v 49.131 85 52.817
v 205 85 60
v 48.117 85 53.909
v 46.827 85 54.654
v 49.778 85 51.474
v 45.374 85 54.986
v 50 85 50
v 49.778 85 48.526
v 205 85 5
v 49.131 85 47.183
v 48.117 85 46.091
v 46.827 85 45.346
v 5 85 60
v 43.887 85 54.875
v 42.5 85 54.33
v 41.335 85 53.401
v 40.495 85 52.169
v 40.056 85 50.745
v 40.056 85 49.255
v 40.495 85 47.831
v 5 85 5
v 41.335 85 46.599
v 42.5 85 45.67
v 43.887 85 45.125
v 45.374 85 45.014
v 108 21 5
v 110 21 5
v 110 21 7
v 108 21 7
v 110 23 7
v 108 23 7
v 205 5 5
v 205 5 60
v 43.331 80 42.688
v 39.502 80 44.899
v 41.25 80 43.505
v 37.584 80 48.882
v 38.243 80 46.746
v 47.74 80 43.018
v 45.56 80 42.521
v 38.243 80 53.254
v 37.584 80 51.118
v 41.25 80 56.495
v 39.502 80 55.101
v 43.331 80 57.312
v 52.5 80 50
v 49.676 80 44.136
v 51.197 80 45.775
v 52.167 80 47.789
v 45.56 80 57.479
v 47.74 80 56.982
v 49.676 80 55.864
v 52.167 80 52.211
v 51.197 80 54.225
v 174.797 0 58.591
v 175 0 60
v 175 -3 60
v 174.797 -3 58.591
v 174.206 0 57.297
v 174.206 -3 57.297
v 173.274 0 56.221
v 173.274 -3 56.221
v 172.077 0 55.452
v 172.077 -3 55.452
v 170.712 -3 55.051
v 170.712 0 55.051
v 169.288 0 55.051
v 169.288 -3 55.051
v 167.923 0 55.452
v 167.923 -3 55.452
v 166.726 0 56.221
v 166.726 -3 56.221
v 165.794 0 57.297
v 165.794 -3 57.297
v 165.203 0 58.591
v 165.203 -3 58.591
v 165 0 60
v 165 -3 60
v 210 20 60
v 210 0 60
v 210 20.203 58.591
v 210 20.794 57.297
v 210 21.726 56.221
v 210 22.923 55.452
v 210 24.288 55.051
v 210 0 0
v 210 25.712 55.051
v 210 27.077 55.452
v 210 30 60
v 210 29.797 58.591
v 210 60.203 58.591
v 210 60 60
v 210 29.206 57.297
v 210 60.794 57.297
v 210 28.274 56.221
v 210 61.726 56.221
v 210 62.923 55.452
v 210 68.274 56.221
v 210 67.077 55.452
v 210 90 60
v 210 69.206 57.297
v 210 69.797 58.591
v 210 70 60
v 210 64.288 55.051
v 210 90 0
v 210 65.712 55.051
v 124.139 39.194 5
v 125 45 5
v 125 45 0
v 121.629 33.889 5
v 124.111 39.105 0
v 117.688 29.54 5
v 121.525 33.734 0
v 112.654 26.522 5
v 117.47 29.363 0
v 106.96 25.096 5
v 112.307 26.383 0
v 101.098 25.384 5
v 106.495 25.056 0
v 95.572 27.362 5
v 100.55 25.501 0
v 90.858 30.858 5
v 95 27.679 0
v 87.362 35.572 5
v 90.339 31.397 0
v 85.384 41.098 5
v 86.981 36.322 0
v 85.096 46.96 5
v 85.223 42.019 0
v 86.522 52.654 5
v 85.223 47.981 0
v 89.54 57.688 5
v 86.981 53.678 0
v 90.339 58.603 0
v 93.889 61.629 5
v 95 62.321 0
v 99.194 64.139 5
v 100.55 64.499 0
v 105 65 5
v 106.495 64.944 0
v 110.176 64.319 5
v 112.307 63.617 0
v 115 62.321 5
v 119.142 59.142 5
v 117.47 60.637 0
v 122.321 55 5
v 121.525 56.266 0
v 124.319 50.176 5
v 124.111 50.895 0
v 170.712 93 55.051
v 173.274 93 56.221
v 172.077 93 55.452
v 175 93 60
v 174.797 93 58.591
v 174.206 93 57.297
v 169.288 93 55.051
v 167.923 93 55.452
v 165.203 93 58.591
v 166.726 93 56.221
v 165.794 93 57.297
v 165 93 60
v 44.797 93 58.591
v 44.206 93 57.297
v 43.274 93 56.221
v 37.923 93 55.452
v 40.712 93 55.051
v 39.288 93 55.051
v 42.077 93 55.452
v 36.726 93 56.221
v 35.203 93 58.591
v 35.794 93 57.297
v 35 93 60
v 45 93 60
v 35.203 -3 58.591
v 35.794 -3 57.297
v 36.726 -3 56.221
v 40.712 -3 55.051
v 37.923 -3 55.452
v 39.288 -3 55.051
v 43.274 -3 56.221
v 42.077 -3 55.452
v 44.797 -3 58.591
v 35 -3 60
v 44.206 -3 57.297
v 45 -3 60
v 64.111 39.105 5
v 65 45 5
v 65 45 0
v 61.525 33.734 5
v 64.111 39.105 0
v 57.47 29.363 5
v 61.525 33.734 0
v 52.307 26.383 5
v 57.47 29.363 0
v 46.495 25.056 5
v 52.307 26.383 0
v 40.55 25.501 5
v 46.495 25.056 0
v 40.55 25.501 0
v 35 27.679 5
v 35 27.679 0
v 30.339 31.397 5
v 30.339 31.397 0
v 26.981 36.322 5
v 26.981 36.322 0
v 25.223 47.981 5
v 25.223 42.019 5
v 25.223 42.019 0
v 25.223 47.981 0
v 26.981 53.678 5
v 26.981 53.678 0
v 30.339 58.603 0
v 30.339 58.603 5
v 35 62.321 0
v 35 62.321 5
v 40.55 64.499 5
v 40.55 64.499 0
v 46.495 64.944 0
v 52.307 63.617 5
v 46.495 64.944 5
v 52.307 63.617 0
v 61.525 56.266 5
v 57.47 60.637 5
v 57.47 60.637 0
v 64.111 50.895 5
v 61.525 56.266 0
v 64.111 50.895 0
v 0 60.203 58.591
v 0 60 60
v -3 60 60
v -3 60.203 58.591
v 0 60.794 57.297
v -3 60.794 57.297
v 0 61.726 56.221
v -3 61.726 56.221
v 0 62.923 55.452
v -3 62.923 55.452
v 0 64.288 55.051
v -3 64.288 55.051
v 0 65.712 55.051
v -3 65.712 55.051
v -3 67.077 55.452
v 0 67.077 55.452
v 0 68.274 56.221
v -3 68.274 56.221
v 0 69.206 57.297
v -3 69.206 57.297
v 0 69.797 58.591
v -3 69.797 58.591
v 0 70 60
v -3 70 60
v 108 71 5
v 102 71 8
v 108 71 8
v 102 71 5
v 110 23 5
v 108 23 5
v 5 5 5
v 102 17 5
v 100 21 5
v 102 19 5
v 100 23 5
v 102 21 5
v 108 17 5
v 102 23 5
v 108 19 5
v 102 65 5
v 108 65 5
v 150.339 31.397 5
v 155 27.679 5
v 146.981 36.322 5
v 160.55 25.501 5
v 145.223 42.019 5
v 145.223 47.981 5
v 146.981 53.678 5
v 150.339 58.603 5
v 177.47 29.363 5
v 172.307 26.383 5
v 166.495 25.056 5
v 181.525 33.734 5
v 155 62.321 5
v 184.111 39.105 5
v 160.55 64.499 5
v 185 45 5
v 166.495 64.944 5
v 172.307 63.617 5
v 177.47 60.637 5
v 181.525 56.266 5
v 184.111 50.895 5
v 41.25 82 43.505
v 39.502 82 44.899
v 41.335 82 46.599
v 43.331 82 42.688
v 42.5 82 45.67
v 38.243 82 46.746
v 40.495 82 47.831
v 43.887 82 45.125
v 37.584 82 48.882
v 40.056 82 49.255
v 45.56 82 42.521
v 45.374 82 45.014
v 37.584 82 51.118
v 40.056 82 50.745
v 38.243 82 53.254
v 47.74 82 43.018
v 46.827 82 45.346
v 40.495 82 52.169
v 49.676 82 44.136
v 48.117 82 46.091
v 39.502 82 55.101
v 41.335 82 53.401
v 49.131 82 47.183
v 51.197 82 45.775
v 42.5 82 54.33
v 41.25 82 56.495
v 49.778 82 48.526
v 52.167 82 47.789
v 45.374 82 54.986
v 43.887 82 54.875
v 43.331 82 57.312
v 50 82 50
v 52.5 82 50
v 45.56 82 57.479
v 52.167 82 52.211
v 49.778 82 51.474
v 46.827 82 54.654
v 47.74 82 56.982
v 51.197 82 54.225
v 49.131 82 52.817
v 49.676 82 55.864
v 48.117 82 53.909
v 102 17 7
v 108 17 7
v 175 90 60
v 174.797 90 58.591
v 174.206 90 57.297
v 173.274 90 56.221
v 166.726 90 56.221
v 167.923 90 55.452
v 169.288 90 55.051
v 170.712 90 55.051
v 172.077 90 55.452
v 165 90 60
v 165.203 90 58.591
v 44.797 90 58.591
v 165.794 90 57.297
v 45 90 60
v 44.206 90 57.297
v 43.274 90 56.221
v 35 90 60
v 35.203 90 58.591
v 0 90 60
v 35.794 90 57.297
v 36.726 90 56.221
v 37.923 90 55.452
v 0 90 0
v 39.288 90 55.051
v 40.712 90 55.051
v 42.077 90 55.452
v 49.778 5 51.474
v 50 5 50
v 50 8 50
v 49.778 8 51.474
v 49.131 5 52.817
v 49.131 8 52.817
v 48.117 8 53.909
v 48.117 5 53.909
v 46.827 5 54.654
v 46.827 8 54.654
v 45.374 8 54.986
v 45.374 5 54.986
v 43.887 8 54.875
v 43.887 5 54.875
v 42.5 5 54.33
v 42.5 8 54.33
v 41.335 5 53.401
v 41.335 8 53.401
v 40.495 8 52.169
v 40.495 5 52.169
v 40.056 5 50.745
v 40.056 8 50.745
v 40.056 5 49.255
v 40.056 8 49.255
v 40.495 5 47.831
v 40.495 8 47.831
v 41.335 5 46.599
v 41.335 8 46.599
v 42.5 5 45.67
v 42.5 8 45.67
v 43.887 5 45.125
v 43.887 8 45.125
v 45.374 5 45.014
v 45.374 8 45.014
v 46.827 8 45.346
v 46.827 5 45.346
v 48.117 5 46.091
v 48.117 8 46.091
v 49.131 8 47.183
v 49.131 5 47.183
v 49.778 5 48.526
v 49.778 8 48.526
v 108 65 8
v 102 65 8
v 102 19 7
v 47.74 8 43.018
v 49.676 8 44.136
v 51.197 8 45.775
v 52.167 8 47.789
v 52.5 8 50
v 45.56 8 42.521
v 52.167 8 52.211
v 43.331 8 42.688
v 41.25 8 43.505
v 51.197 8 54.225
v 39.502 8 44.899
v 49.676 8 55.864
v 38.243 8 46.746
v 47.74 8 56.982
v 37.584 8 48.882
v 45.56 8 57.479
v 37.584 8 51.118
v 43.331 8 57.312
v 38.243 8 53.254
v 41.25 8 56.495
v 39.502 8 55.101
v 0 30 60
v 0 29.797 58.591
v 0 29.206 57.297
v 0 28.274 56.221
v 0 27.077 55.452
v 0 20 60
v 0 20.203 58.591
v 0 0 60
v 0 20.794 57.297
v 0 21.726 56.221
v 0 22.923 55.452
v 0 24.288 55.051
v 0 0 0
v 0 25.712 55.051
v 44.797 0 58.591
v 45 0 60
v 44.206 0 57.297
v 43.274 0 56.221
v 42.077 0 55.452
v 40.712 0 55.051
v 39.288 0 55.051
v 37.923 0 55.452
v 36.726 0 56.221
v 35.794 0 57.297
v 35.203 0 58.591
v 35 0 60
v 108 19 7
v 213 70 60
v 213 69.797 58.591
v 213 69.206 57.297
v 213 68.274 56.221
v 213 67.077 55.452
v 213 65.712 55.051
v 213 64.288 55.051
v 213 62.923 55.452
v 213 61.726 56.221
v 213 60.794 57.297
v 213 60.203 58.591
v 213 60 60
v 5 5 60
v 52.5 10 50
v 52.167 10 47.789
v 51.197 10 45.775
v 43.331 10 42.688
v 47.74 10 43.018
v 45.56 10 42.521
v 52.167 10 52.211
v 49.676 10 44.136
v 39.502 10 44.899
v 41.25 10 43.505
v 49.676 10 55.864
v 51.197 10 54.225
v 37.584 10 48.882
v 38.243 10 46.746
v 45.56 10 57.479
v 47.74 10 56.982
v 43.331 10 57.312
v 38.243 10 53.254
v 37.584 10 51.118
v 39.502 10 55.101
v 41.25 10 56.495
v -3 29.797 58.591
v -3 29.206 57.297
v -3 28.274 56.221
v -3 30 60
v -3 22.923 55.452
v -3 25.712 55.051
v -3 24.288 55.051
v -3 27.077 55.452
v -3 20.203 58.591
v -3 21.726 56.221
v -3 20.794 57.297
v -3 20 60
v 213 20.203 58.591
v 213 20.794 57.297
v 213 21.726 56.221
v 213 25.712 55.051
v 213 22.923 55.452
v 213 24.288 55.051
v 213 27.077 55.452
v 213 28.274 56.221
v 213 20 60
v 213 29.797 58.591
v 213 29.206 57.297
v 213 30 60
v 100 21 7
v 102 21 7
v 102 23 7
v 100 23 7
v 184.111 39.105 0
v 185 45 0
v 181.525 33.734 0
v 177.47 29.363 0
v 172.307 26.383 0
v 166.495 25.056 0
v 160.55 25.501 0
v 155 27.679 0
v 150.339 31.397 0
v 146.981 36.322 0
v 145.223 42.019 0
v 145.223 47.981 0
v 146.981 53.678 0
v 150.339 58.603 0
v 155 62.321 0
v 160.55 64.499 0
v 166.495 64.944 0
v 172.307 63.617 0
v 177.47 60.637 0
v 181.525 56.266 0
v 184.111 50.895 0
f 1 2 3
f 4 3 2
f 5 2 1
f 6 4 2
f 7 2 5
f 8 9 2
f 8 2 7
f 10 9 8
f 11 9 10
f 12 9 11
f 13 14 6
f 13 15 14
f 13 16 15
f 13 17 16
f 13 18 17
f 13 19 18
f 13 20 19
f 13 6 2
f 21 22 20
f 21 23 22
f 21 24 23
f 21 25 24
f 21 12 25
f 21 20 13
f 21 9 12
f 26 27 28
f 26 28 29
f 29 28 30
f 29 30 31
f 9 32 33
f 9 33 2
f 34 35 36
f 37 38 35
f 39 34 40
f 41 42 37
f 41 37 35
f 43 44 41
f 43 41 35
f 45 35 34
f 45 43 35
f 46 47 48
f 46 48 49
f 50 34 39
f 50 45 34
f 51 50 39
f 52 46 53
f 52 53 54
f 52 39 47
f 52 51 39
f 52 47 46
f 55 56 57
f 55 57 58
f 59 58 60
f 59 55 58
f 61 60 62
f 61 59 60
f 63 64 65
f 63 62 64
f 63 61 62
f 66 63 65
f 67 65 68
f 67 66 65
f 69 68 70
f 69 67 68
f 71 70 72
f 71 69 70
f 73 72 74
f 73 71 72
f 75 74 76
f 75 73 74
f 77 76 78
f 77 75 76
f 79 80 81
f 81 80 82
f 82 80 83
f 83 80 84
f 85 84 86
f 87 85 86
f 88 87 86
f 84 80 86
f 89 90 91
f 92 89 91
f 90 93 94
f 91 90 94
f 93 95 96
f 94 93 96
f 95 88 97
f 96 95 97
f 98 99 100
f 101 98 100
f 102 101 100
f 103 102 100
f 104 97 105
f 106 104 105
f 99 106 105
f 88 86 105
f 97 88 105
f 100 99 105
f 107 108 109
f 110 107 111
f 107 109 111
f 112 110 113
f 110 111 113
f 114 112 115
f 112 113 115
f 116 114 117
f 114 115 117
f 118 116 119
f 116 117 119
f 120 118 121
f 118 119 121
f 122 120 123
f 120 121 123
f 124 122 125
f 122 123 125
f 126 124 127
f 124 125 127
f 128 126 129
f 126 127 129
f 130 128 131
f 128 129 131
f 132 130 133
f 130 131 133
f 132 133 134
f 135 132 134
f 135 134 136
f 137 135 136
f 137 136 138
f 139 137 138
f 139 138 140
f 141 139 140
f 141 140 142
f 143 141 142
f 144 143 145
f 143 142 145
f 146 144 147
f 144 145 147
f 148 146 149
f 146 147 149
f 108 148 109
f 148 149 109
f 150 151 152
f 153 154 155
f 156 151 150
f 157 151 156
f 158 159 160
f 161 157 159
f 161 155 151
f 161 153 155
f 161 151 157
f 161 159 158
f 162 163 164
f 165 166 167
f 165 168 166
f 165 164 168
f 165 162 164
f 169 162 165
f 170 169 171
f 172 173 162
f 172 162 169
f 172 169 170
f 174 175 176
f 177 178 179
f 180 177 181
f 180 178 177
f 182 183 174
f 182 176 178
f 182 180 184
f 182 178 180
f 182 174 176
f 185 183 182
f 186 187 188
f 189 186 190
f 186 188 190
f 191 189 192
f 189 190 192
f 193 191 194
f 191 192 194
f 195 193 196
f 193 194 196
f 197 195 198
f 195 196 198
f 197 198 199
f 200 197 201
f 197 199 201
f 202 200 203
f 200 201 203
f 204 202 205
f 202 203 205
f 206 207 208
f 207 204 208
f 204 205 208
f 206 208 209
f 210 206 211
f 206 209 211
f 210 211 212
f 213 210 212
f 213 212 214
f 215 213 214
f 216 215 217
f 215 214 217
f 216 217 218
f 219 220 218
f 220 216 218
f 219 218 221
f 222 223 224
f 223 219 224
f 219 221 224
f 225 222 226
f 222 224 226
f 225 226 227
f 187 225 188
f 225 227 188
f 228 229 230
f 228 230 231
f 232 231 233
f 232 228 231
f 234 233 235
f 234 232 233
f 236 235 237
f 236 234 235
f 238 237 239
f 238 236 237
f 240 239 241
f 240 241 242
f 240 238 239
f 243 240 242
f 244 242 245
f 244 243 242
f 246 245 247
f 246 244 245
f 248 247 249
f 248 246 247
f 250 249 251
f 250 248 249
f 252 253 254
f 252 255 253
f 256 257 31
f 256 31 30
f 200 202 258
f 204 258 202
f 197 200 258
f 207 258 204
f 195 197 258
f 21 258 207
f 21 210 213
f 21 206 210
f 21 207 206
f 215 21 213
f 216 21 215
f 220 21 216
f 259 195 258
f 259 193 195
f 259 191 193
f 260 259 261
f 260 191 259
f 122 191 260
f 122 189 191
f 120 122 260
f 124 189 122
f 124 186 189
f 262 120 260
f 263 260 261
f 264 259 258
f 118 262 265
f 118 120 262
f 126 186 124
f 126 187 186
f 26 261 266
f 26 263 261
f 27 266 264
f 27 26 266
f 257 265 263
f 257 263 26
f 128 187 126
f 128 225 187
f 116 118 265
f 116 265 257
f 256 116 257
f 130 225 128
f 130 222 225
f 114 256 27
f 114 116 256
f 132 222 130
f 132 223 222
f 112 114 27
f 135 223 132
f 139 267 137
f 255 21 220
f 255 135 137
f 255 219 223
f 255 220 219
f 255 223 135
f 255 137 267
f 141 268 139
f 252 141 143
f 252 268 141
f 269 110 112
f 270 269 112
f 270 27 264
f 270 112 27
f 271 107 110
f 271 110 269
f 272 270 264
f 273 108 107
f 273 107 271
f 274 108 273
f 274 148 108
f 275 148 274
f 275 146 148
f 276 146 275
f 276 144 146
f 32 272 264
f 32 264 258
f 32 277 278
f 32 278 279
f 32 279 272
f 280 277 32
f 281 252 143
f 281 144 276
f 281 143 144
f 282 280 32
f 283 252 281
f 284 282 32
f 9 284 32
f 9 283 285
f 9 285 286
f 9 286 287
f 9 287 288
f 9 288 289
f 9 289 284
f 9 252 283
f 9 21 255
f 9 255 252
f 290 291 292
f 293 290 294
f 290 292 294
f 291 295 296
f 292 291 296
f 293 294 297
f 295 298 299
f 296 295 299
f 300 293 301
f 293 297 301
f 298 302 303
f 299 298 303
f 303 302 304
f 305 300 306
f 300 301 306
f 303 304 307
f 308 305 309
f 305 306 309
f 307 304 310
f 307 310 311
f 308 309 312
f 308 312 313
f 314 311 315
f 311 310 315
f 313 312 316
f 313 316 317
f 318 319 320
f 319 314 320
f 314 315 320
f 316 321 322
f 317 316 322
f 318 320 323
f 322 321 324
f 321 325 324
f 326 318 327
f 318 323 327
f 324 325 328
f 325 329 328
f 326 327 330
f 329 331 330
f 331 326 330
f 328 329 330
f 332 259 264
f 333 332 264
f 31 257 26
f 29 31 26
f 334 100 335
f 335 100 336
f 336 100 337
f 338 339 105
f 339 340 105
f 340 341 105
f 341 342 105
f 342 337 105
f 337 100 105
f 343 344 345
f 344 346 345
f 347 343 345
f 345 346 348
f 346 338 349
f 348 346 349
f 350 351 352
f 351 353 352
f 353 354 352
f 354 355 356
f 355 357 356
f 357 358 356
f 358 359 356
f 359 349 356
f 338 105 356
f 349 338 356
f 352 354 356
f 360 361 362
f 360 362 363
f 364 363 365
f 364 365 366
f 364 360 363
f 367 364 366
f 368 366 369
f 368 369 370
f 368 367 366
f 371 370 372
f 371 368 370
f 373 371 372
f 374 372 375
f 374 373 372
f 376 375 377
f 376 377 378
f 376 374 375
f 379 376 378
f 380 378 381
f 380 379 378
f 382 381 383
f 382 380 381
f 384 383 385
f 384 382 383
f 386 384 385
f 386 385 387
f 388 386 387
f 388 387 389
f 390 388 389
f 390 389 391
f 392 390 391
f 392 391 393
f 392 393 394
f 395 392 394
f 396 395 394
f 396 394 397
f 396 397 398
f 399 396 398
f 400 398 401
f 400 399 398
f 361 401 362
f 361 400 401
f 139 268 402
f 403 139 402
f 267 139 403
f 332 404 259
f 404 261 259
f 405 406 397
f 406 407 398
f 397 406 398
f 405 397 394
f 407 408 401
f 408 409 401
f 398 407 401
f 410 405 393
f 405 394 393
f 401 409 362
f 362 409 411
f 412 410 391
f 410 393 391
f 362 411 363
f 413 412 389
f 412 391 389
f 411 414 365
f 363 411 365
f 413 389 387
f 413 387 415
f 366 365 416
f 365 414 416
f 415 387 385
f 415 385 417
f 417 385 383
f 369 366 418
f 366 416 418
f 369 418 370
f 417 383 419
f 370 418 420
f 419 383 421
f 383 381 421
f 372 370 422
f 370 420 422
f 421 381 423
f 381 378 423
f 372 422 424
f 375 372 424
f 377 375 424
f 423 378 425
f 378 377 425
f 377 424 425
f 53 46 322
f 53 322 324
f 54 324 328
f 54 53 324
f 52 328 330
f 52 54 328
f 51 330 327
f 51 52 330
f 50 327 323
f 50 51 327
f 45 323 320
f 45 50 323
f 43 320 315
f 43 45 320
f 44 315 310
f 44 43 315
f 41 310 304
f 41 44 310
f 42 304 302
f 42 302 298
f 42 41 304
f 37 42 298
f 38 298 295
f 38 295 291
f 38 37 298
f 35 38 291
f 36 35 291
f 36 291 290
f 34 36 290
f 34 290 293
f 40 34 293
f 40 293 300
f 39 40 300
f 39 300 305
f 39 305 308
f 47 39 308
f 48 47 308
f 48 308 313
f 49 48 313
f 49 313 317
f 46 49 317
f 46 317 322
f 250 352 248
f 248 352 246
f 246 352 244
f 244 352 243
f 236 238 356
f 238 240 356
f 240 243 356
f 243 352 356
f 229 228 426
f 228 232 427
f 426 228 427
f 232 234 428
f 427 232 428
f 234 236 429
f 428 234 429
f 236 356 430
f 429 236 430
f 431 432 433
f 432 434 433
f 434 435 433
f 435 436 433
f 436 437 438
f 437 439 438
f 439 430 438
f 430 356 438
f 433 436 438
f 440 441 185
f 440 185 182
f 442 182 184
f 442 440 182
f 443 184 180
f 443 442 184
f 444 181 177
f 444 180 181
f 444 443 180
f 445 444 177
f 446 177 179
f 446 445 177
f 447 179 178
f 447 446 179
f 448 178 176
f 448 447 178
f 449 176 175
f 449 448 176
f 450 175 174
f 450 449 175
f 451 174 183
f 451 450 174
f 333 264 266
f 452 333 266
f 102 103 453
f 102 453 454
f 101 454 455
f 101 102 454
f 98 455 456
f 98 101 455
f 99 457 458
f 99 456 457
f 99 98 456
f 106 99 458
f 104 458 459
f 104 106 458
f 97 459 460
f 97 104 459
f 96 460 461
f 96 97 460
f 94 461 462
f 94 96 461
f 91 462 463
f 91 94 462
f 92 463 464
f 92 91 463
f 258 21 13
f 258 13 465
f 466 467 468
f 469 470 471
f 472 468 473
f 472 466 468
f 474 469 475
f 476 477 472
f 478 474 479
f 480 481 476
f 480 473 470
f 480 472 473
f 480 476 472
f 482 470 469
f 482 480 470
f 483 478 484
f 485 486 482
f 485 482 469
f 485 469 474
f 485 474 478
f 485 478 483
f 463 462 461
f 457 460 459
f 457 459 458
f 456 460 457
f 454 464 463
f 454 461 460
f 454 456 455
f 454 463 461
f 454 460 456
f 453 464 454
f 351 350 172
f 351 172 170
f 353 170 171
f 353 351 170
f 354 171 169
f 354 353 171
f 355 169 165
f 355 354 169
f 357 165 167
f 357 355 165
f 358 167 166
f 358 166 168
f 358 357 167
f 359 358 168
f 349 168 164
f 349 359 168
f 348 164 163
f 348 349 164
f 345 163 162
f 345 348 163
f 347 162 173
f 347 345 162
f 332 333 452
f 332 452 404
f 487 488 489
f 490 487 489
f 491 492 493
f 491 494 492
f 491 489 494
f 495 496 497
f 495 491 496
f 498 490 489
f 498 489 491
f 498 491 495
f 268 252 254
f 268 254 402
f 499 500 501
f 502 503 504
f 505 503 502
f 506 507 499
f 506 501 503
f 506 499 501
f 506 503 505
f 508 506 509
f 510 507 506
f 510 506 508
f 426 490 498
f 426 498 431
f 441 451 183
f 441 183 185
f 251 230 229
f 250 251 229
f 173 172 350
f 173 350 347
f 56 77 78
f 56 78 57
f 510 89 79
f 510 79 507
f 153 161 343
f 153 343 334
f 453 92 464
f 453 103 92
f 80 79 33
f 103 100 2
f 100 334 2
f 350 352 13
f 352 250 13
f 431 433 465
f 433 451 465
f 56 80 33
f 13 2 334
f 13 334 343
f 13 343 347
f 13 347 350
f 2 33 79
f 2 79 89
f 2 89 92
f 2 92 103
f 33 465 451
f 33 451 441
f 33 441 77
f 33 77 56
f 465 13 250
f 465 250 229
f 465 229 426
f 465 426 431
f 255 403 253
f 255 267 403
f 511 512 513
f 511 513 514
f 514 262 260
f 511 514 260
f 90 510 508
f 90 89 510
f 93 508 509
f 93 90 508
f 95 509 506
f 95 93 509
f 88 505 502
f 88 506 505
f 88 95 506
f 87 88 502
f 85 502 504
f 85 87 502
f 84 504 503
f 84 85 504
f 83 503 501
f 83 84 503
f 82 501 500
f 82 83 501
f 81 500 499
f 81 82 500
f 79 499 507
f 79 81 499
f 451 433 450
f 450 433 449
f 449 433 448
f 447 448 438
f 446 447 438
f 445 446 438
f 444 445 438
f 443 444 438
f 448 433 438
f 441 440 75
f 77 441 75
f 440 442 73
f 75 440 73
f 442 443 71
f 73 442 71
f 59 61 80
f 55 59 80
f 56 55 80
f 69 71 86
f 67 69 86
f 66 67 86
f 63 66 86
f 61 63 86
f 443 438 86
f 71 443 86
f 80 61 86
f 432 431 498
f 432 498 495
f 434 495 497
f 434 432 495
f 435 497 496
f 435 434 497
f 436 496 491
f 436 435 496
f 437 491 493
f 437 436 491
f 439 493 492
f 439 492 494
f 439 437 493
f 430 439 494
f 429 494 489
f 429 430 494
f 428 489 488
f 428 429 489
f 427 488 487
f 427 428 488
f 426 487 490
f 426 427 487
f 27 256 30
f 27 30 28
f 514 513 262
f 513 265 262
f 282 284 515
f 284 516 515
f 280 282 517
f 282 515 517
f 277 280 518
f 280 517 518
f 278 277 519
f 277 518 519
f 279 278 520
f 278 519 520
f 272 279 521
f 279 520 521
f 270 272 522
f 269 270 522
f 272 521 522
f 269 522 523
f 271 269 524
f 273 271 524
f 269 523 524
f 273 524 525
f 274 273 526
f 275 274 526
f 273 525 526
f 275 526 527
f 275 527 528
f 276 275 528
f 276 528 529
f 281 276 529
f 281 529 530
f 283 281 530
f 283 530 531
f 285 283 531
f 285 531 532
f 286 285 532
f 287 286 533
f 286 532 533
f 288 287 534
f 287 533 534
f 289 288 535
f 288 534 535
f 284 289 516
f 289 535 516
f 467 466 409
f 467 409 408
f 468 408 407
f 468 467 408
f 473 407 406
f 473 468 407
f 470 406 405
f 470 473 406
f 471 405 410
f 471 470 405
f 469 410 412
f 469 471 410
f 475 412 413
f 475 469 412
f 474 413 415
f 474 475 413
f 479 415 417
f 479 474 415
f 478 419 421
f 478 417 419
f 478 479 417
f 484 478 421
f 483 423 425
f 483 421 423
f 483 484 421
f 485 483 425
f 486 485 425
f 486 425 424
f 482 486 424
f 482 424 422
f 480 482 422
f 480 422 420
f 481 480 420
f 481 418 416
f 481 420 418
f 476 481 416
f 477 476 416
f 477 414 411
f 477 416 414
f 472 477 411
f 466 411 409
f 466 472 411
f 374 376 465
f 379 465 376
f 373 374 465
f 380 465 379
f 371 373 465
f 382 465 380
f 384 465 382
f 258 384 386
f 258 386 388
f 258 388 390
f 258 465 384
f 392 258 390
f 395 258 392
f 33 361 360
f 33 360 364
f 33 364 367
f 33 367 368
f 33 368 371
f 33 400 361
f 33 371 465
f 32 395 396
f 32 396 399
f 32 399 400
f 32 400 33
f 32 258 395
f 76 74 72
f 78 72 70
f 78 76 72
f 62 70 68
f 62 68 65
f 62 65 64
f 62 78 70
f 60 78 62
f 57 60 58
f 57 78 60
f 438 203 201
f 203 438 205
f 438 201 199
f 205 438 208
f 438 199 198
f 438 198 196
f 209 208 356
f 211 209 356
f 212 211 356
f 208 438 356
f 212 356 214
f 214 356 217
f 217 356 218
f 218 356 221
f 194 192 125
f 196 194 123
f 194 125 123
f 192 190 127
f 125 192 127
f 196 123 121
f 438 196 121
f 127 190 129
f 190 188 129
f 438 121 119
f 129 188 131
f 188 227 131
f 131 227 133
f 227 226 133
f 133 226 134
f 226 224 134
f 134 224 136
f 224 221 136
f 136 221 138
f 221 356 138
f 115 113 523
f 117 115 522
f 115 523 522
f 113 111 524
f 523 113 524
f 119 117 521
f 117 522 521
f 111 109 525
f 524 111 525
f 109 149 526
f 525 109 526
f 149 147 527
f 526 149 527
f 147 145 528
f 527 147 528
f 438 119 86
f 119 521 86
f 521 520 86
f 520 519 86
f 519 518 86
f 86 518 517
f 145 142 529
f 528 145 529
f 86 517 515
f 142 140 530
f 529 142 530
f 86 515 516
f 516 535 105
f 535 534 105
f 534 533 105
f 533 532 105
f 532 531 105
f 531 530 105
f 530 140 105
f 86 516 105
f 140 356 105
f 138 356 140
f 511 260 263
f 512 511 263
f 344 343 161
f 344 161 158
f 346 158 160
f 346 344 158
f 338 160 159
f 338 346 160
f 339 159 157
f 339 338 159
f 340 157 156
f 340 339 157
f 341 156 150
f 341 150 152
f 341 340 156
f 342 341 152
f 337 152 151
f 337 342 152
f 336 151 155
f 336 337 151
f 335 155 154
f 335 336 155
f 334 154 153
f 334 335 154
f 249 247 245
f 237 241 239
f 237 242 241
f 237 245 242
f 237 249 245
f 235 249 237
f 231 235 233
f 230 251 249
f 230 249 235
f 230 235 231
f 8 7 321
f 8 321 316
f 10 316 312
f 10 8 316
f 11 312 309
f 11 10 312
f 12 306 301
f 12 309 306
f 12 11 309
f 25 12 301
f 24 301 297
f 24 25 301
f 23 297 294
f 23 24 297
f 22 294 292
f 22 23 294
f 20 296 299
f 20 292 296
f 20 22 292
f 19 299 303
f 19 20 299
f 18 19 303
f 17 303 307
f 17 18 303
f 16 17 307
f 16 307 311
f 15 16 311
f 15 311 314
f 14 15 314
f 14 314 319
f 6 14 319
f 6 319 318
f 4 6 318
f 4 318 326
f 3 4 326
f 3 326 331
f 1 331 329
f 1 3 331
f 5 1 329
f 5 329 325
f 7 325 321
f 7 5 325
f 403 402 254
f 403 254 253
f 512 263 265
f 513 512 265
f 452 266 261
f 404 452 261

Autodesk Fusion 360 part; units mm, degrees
sketch "Sketch1" plane through (0, 0, 0) normal (0, 0, 1) x (1, 0, 0)
  line L0 (0, 0) -> (210, 0)
  line L1 (210, 0) -> (210, 90)
  line L2 (210, 90) -> (0, 90)
  line L3 (0, 90) -> (0, 0)
  line L4 (5, 5) -> (205, 5)
  line L5 (205, 5) -> (205, 85)
  line L6 (205, 85) -> (5, 85)
  line L7 (5, 85) -> (5, 5)
  circle A0 centre (45, 45) radius 20
  circle A1 centre (105, 45) radius 20
  circle A2 centre (165, 45) radius 20
  dimension "d1" = 210
  dimension "d2" = 90
  dimension "d3" = 200
  dimension "d4" = 80
  dimension "d5" = 5
  dimension "d6" = 5
  dimension "d7" = 40
  dimension "d8" = 40
  dimension "d9" = 40
  dimension "d10" = 105
  dimension "d11" = 45
  dimension "d12" = 45
  dimension "d13" = 45
  dimension "d14" = 60
  dimension "d15" = 60
extrude "Extrude1" add sketch "Sketch1" along normal blind 5 contours L4 L5 L6 L7
extrude "Extrude2" add sketch "Sketch1" along normal blind 60 contours L0 L1 L2 L3
sketch "Sketch2" plane through (210, 0, 0) normal (1, 0, 0) x (0, 1, 0)
  line L0 (0, 0) -> (90, 0)
  line L1 (90, 0) -> (90, 60)
  line L2 (90, 60) -> (0, 60)
  line L3 (0, 60) -> (0, 0)
  circle A0 centre (25, 60) radius 5
  circle A1 centre (65, 60) radius 5
  line L4 (20, 60) -> (30, 60)
  line L5 (60, 60) -> (70, 60)
  dimension "d20" = 10
  dimension "d21" = 10
  dimension "d22" = 25
  dimension "d23" = 25
extrude "Extrude3" add sketch "Sketch2" along normal blind 3 contours L2 A0 L4 | L2 A1 L5 picked at (25.8333, 56.3489) picked at (63.59, 57.0721)
sketch "Sketch3" plane through (0, 0, 0) normal (0, -1, 0) x (1, 0, 0)
  line L0 (0, 0) -> (210, 0)
  line L1 (210, 0) -> (210, 60)
  line L2 (210, 60) -> (0, 60)
  line L3 (0, 60) -> (0, 0)
  circle A0 centre (40, 60) radius 5
  circle A1 centre (170, 60) radius 5
  line L4 (35, 60) -> (45, 60)
  line L5 (165, 60) -> (175, 60)
  dimension "d26" = 10
  dimension "d27" = 10
  dimension "d28" = 40
  dimension "d29" = 40
extrude "Extrude4" add sketch "Sketch3" along normal blind 3 contours L2 A0 L4 | L2 A1 L5 picked at (38.8698, 57.4825) picked at (169.3911, 57.9517)
ref_plane "WorkPlane1" through (105, 45, 30) normal (0, -1, 0) x (1, 0, 0)
ref_plane "WorkPlane2" through (105, 0, 0) normal (1, 0, 0) x (0, 1, 0)
mirror "Mirror1" about plane through (105, 45, 30) normal (0, -1, 0) of bodies 1 merged
mirror "Mirror2" about plane through (105, 0, 0) normal (1, 0, 0) of bodies 1 merged
sketch "Sketch4" plane through (0, 85, 0) normal (0, -1, 0) x (1, 0, 0)
  line L0 (5, 5) -> (205, 5)
  line L1 (205, 5) -> (205, 60)
  line L2 (205, 60) -> (5, 60)
  line L3 (5, 60) -> (5, 5)
  circle A0 centre (45, 50) radius 5
  line L4 (0, 0) -> (0, 60)
  dimension "d38" = 45
  dimension "d39" = 10
extrude "Extrude5" add sketch "Sketch4" along normal blind 5 contours A0
sketch "Sketch5" plane through (0, 80, 0) normal (0, -1, 0) x (1, 0, 0)
  circle A0 centre (45, 50) radius 5
  circle A1 centre (45, 50) radius 7.5
  dimension "d42" = 15
extrude "Extrude6" add sketch "Sketch5" against normal blind 2
mirror "Mirror3" about plane through (105, 45, 30) normal (0, -1, 0) of bodies 1 merged
sketch "Sketch6" plane through (0, 0, 5) normal (0, 0, 1) x (-1, 0, 0)
  arc A0 (-65, -45) -> (-25, -45) centre (-45, -45) ccw
  arc A1 (-25, -45) -> (-65, -45) centre (-45, -45) ccw
  arc A2 (-125, -45) -> (-85, -45) centre (-105, -45) ccw
  arc A3 (-85, -45) -> (-125, -45) centre (-105, -45) ccw
  arc A4 (-185, -45) -> (-145, -45) centre (-165, -45) ccw
  arc A5 (-145, -45) -> (-185, -45) centre (-165, -45) ccw
  line L0 (-5, -85) -> (-5, -5)
  line L1 (-5, -5) -> (-205, -5)
  line L2 (-205, -5) -> (-205, -85)
  line L3 (-205, -85) -> (-5, -85)
  line L4 (-102, -71) -> (-108, -71)
  line L5 (-108, -71) -> (-108, -65)
  line L6 (-108, -65) -> (-102, -65)
  line L7 (-102, -65) -> (-102, -71)
  line L8 (-102, -25) -> (-108, -25)
  line L9 (-108, -25) -> (-108, -19)
  line L10 (-108, -19) -> (-102, -19)
  line L11 (-102, -19) -> (-102, -25)
  circle A6 centre (-105, -45) radius 20
  line L12 (-210, 0) -> (-210, -90)
  line L13 (-102, -71) -> (-108, -71)
  line L14 (-108, -71) -> (-108, -73)
  line L15 (-108, -73) -> (-102, -73)
  line L16 (-102, -73) -> (-102, -71)
  line L17 (-108, -69) -> (-110, -69)
  line L18 (-110, -69) -> (-110, -67)
  line L19 (-110, -67) -> (-108, -67)
  line L20 (-108, -67) -> (-108, -69)
  line L21 (-102, -69) -> (-100, -69)
  line L22 (-100, -69) -> (-100, -67)
  line L23 (-100, -67) -> (-102, -67)
  line L24 (-102, -67) -> (-102, -69)
  line L25 (-108, -19) -> (-102, -19)
  line L26 (-102, -19) -> (-102, -17)
  line L27 (-102, -17) -> (-108, -17)
  line L28 (-108, -17) -> (-108, -19)
  line L29 (-108, -23) -> (-110, -23)
  line L30 (-110, -23) -> (-110, -21)
  line L31 (-110, -21) -> (-108, -21)
  line L32 (-108, -21) -> (-108, -23)
  line L33 (-102, -23) -> (-100, -23)
  line L34 (-100, -23) -> (-100, -21)
  line L35 (-100, -21) -> (-102, -21)
  line L36 (-102, -21) -> (-102, -23)
  dimension "d47" = 6
  dimension "d48" = 6
  dimension "d49" = 6
  dimension "d50" = 6
  dimension "d51" = 102
  dimension "d52" = 2
  dimension "d53" = 2
  dimension "d54" = 2
  dimension "d55" = 2
  dimension "d56" = 2
  dimension "d57" = 2
  dimension "d58" = 2
  dimension "d63" = 6
  dimension "d64" = 2
  dimension "d65" = 2
  dimension "d66" = 2
  dimension "d67" = 2
  dimension "d68" = 2
  dimension "d69" = 2
  dimension "d70" = 2
extrude "Extrude7" add sketch "Sketch6" along normal blind 3 contours L4 L5 L6 L7 L13 L20 L24
extrude "Extrude8" add sketch "Sketch6" along normal blind 2 contours L11 L33 L34 L35 L36 | L9 L29 L30 L31 L32 | L10 L25 L26 L27 L28
